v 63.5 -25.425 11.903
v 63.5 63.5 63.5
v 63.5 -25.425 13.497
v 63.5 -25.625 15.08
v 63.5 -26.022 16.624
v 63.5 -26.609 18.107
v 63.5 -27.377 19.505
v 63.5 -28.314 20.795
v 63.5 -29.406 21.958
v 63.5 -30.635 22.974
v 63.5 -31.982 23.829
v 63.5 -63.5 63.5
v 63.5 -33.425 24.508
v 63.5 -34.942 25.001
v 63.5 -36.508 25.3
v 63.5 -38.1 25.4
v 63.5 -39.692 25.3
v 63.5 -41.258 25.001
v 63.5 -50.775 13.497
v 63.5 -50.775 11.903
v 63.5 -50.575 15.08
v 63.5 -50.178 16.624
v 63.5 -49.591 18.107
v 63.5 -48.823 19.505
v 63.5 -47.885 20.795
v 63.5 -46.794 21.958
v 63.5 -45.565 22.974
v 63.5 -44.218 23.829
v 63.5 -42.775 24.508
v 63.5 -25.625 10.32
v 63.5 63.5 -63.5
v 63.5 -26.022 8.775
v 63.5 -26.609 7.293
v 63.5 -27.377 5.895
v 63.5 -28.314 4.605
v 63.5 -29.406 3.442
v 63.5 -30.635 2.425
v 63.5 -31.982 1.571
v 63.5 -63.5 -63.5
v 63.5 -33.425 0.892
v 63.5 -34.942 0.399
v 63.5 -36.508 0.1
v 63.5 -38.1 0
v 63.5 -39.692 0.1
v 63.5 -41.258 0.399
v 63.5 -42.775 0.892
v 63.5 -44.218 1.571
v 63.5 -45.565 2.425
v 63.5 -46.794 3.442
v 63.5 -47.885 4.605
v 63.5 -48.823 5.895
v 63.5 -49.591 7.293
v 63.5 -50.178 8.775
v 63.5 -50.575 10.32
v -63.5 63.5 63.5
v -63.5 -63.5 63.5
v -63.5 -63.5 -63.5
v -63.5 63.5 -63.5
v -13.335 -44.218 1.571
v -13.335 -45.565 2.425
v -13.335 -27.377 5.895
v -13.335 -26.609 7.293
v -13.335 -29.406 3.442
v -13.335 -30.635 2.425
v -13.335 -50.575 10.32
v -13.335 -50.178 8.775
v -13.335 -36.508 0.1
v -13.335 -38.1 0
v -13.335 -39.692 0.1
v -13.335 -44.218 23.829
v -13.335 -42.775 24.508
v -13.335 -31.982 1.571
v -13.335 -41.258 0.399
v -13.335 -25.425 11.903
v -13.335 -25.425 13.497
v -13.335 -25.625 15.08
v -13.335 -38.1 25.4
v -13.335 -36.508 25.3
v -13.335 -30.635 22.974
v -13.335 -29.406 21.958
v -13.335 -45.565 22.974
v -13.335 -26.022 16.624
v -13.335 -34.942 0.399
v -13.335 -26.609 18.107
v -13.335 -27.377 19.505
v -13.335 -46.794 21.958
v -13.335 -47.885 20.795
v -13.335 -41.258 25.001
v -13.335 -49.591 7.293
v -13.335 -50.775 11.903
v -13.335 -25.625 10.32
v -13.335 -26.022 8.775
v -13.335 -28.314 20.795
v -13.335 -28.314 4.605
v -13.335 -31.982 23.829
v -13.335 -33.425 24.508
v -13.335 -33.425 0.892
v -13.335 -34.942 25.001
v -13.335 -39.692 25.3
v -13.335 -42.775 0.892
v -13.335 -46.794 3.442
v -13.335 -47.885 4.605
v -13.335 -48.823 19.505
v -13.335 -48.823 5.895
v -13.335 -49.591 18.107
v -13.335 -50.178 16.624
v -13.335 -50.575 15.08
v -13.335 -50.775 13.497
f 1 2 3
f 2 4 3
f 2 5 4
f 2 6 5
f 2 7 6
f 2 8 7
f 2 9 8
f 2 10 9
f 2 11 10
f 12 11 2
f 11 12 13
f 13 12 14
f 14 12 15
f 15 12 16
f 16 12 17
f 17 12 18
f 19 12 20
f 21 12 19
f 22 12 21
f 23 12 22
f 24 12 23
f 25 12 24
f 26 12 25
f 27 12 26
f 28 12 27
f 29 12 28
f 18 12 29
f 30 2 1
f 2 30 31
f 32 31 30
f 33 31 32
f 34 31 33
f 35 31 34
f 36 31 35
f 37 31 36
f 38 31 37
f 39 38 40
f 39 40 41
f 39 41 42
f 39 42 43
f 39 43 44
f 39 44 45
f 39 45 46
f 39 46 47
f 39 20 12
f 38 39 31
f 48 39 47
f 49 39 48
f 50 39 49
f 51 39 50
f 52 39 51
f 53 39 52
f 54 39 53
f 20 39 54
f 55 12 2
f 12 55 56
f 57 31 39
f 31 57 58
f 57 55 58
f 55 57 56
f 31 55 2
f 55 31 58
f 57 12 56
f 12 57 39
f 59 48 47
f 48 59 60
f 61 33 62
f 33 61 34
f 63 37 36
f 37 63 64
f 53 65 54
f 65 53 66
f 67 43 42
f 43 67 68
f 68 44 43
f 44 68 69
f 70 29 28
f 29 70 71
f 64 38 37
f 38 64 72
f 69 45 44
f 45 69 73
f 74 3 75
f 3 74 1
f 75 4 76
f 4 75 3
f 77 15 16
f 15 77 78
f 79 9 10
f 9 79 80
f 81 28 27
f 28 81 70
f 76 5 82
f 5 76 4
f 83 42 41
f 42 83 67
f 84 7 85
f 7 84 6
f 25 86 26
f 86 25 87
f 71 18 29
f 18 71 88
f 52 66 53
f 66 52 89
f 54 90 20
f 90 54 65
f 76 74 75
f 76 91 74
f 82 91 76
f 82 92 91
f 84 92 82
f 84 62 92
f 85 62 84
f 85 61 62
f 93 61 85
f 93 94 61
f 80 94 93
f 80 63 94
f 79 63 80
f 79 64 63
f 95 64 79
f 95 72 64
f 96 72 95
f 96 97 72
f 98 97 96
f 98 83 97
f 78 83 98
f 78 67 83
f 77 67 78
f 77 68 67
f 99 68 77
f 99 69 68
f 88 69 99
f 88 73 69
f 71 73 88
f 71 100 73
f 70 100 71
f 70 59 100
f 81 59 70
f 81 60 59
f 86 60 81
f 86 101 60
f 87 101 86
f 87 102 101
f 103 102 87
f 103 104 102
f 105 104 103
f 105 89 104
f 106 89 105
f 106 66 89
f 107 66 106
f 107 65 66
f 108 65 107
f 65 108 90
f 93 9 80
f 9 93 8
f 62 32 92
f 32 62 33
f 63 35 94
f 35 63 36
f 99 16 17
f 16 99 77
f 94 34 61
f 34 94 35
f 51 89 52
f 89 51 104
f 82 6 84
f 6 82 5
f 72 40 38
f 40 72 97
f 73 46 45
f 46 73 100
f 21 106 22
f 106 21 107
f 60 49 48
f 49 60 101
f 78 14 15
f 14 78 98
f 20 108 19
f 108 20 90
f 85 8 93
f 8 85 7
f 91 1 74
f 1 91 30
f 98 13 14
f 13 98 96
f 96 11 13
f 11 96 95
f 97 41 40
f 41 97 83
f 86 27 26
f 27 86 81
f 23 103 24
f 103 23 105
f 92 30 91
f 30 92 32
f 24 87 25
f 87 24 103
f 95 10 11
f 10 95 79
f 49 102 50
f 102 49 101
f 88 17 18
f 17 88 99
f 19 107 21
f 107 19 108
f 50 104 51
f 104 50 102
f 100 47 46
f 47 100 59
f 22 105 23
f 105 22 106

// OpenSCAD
// A quick OpenSCAD script for generating a solid model 
// matching the specification of 
// Learning Localized Geometric Features Using 3D-CNN: An Application to Manufacturability Analysis of Drilled Holes
// by Aditya Balu et. Al. 2016,  	arXiv:1612.02141
//
// Implementation by Ben Weiss, 2017, MIT Licensed
/*

Copyright 2017 Ben Weiss

Permission is hereby granted, free of charge, to any person obtaining a copy 
of this software and associated documentation files (the "Software"), to deal 
in the Software without restriction, including without limitation the rights to 
use, copy, modify, merge, publish, distribute, sublicense, and/or sell copies 
of the Software, and to permit persons to whom the Software is furnished to do 
so, subject to the following conditions:

The above copyright notice and this permission notice shall be included in all 
copies or substantial portions of the Software.

THE SOFTWARE IS PROVIDED "AS IS", WITHOUT WARRANTY OF ANY KIND, EXPRESS OR 
IMPLIED, INCLUDING BUT NOT LIMITED TO THE WARRANTIES OF MERCHANTABILITY, 
FITNESS FOR A PARTICULAR PURPOSE AND NONINFRINGEMENT. IN NO EVENT SHALL THE 
AUTHORS OR COPYRIGHT HOLDERS BE LIABLE FOR ANY CLAIM, DAMAGES OR OTHER 
LIABILITY, WHETHER IN AN ACTION OF CONTRACT, TORT OR OTHERWISE, ARISING FROM, 
OUT OF OR IN CONNECTION WITH THE SOFTWARE OR THE USE OR OTHER DEALINGS IN THE 
SOFTWARE.
*/

// Define the object size, in inches
width = 5;
height = 5;
depth = 5;

// Define the hole location, in inches. These will be overridden when the script is executed from Python
PosX = 2;
PosY = 1;
HoleDepth = 3;
HoleDiam = 1;
Face = 5;       // 0 thru 5, detemines which face the hole will be on. [X-Z, XY, XZ, X-Y, ZY, -ZY]


// Derived Variables
mm_per_in = 25.4;
eps = 0.05;

rot = [Face < 4 ? Face * 90 - 90 : 0, Face >= 4 ? -90 + 180 * (Face - 4) : 0, 0];
echo(rot=rot);

// Geometry
scale([1, 1, 1] * mm_per_in)
difference()
{
    cube([width, height, depth], center=true);
    rotate(rot)
    translate([-width * 0.5 + PosX, -height * 0.5 + PosY, depth * 0.5])
    cylinder(d=HoleDiam, h=HoleDepth*2 + eps, center=true, $fn=50);
}
